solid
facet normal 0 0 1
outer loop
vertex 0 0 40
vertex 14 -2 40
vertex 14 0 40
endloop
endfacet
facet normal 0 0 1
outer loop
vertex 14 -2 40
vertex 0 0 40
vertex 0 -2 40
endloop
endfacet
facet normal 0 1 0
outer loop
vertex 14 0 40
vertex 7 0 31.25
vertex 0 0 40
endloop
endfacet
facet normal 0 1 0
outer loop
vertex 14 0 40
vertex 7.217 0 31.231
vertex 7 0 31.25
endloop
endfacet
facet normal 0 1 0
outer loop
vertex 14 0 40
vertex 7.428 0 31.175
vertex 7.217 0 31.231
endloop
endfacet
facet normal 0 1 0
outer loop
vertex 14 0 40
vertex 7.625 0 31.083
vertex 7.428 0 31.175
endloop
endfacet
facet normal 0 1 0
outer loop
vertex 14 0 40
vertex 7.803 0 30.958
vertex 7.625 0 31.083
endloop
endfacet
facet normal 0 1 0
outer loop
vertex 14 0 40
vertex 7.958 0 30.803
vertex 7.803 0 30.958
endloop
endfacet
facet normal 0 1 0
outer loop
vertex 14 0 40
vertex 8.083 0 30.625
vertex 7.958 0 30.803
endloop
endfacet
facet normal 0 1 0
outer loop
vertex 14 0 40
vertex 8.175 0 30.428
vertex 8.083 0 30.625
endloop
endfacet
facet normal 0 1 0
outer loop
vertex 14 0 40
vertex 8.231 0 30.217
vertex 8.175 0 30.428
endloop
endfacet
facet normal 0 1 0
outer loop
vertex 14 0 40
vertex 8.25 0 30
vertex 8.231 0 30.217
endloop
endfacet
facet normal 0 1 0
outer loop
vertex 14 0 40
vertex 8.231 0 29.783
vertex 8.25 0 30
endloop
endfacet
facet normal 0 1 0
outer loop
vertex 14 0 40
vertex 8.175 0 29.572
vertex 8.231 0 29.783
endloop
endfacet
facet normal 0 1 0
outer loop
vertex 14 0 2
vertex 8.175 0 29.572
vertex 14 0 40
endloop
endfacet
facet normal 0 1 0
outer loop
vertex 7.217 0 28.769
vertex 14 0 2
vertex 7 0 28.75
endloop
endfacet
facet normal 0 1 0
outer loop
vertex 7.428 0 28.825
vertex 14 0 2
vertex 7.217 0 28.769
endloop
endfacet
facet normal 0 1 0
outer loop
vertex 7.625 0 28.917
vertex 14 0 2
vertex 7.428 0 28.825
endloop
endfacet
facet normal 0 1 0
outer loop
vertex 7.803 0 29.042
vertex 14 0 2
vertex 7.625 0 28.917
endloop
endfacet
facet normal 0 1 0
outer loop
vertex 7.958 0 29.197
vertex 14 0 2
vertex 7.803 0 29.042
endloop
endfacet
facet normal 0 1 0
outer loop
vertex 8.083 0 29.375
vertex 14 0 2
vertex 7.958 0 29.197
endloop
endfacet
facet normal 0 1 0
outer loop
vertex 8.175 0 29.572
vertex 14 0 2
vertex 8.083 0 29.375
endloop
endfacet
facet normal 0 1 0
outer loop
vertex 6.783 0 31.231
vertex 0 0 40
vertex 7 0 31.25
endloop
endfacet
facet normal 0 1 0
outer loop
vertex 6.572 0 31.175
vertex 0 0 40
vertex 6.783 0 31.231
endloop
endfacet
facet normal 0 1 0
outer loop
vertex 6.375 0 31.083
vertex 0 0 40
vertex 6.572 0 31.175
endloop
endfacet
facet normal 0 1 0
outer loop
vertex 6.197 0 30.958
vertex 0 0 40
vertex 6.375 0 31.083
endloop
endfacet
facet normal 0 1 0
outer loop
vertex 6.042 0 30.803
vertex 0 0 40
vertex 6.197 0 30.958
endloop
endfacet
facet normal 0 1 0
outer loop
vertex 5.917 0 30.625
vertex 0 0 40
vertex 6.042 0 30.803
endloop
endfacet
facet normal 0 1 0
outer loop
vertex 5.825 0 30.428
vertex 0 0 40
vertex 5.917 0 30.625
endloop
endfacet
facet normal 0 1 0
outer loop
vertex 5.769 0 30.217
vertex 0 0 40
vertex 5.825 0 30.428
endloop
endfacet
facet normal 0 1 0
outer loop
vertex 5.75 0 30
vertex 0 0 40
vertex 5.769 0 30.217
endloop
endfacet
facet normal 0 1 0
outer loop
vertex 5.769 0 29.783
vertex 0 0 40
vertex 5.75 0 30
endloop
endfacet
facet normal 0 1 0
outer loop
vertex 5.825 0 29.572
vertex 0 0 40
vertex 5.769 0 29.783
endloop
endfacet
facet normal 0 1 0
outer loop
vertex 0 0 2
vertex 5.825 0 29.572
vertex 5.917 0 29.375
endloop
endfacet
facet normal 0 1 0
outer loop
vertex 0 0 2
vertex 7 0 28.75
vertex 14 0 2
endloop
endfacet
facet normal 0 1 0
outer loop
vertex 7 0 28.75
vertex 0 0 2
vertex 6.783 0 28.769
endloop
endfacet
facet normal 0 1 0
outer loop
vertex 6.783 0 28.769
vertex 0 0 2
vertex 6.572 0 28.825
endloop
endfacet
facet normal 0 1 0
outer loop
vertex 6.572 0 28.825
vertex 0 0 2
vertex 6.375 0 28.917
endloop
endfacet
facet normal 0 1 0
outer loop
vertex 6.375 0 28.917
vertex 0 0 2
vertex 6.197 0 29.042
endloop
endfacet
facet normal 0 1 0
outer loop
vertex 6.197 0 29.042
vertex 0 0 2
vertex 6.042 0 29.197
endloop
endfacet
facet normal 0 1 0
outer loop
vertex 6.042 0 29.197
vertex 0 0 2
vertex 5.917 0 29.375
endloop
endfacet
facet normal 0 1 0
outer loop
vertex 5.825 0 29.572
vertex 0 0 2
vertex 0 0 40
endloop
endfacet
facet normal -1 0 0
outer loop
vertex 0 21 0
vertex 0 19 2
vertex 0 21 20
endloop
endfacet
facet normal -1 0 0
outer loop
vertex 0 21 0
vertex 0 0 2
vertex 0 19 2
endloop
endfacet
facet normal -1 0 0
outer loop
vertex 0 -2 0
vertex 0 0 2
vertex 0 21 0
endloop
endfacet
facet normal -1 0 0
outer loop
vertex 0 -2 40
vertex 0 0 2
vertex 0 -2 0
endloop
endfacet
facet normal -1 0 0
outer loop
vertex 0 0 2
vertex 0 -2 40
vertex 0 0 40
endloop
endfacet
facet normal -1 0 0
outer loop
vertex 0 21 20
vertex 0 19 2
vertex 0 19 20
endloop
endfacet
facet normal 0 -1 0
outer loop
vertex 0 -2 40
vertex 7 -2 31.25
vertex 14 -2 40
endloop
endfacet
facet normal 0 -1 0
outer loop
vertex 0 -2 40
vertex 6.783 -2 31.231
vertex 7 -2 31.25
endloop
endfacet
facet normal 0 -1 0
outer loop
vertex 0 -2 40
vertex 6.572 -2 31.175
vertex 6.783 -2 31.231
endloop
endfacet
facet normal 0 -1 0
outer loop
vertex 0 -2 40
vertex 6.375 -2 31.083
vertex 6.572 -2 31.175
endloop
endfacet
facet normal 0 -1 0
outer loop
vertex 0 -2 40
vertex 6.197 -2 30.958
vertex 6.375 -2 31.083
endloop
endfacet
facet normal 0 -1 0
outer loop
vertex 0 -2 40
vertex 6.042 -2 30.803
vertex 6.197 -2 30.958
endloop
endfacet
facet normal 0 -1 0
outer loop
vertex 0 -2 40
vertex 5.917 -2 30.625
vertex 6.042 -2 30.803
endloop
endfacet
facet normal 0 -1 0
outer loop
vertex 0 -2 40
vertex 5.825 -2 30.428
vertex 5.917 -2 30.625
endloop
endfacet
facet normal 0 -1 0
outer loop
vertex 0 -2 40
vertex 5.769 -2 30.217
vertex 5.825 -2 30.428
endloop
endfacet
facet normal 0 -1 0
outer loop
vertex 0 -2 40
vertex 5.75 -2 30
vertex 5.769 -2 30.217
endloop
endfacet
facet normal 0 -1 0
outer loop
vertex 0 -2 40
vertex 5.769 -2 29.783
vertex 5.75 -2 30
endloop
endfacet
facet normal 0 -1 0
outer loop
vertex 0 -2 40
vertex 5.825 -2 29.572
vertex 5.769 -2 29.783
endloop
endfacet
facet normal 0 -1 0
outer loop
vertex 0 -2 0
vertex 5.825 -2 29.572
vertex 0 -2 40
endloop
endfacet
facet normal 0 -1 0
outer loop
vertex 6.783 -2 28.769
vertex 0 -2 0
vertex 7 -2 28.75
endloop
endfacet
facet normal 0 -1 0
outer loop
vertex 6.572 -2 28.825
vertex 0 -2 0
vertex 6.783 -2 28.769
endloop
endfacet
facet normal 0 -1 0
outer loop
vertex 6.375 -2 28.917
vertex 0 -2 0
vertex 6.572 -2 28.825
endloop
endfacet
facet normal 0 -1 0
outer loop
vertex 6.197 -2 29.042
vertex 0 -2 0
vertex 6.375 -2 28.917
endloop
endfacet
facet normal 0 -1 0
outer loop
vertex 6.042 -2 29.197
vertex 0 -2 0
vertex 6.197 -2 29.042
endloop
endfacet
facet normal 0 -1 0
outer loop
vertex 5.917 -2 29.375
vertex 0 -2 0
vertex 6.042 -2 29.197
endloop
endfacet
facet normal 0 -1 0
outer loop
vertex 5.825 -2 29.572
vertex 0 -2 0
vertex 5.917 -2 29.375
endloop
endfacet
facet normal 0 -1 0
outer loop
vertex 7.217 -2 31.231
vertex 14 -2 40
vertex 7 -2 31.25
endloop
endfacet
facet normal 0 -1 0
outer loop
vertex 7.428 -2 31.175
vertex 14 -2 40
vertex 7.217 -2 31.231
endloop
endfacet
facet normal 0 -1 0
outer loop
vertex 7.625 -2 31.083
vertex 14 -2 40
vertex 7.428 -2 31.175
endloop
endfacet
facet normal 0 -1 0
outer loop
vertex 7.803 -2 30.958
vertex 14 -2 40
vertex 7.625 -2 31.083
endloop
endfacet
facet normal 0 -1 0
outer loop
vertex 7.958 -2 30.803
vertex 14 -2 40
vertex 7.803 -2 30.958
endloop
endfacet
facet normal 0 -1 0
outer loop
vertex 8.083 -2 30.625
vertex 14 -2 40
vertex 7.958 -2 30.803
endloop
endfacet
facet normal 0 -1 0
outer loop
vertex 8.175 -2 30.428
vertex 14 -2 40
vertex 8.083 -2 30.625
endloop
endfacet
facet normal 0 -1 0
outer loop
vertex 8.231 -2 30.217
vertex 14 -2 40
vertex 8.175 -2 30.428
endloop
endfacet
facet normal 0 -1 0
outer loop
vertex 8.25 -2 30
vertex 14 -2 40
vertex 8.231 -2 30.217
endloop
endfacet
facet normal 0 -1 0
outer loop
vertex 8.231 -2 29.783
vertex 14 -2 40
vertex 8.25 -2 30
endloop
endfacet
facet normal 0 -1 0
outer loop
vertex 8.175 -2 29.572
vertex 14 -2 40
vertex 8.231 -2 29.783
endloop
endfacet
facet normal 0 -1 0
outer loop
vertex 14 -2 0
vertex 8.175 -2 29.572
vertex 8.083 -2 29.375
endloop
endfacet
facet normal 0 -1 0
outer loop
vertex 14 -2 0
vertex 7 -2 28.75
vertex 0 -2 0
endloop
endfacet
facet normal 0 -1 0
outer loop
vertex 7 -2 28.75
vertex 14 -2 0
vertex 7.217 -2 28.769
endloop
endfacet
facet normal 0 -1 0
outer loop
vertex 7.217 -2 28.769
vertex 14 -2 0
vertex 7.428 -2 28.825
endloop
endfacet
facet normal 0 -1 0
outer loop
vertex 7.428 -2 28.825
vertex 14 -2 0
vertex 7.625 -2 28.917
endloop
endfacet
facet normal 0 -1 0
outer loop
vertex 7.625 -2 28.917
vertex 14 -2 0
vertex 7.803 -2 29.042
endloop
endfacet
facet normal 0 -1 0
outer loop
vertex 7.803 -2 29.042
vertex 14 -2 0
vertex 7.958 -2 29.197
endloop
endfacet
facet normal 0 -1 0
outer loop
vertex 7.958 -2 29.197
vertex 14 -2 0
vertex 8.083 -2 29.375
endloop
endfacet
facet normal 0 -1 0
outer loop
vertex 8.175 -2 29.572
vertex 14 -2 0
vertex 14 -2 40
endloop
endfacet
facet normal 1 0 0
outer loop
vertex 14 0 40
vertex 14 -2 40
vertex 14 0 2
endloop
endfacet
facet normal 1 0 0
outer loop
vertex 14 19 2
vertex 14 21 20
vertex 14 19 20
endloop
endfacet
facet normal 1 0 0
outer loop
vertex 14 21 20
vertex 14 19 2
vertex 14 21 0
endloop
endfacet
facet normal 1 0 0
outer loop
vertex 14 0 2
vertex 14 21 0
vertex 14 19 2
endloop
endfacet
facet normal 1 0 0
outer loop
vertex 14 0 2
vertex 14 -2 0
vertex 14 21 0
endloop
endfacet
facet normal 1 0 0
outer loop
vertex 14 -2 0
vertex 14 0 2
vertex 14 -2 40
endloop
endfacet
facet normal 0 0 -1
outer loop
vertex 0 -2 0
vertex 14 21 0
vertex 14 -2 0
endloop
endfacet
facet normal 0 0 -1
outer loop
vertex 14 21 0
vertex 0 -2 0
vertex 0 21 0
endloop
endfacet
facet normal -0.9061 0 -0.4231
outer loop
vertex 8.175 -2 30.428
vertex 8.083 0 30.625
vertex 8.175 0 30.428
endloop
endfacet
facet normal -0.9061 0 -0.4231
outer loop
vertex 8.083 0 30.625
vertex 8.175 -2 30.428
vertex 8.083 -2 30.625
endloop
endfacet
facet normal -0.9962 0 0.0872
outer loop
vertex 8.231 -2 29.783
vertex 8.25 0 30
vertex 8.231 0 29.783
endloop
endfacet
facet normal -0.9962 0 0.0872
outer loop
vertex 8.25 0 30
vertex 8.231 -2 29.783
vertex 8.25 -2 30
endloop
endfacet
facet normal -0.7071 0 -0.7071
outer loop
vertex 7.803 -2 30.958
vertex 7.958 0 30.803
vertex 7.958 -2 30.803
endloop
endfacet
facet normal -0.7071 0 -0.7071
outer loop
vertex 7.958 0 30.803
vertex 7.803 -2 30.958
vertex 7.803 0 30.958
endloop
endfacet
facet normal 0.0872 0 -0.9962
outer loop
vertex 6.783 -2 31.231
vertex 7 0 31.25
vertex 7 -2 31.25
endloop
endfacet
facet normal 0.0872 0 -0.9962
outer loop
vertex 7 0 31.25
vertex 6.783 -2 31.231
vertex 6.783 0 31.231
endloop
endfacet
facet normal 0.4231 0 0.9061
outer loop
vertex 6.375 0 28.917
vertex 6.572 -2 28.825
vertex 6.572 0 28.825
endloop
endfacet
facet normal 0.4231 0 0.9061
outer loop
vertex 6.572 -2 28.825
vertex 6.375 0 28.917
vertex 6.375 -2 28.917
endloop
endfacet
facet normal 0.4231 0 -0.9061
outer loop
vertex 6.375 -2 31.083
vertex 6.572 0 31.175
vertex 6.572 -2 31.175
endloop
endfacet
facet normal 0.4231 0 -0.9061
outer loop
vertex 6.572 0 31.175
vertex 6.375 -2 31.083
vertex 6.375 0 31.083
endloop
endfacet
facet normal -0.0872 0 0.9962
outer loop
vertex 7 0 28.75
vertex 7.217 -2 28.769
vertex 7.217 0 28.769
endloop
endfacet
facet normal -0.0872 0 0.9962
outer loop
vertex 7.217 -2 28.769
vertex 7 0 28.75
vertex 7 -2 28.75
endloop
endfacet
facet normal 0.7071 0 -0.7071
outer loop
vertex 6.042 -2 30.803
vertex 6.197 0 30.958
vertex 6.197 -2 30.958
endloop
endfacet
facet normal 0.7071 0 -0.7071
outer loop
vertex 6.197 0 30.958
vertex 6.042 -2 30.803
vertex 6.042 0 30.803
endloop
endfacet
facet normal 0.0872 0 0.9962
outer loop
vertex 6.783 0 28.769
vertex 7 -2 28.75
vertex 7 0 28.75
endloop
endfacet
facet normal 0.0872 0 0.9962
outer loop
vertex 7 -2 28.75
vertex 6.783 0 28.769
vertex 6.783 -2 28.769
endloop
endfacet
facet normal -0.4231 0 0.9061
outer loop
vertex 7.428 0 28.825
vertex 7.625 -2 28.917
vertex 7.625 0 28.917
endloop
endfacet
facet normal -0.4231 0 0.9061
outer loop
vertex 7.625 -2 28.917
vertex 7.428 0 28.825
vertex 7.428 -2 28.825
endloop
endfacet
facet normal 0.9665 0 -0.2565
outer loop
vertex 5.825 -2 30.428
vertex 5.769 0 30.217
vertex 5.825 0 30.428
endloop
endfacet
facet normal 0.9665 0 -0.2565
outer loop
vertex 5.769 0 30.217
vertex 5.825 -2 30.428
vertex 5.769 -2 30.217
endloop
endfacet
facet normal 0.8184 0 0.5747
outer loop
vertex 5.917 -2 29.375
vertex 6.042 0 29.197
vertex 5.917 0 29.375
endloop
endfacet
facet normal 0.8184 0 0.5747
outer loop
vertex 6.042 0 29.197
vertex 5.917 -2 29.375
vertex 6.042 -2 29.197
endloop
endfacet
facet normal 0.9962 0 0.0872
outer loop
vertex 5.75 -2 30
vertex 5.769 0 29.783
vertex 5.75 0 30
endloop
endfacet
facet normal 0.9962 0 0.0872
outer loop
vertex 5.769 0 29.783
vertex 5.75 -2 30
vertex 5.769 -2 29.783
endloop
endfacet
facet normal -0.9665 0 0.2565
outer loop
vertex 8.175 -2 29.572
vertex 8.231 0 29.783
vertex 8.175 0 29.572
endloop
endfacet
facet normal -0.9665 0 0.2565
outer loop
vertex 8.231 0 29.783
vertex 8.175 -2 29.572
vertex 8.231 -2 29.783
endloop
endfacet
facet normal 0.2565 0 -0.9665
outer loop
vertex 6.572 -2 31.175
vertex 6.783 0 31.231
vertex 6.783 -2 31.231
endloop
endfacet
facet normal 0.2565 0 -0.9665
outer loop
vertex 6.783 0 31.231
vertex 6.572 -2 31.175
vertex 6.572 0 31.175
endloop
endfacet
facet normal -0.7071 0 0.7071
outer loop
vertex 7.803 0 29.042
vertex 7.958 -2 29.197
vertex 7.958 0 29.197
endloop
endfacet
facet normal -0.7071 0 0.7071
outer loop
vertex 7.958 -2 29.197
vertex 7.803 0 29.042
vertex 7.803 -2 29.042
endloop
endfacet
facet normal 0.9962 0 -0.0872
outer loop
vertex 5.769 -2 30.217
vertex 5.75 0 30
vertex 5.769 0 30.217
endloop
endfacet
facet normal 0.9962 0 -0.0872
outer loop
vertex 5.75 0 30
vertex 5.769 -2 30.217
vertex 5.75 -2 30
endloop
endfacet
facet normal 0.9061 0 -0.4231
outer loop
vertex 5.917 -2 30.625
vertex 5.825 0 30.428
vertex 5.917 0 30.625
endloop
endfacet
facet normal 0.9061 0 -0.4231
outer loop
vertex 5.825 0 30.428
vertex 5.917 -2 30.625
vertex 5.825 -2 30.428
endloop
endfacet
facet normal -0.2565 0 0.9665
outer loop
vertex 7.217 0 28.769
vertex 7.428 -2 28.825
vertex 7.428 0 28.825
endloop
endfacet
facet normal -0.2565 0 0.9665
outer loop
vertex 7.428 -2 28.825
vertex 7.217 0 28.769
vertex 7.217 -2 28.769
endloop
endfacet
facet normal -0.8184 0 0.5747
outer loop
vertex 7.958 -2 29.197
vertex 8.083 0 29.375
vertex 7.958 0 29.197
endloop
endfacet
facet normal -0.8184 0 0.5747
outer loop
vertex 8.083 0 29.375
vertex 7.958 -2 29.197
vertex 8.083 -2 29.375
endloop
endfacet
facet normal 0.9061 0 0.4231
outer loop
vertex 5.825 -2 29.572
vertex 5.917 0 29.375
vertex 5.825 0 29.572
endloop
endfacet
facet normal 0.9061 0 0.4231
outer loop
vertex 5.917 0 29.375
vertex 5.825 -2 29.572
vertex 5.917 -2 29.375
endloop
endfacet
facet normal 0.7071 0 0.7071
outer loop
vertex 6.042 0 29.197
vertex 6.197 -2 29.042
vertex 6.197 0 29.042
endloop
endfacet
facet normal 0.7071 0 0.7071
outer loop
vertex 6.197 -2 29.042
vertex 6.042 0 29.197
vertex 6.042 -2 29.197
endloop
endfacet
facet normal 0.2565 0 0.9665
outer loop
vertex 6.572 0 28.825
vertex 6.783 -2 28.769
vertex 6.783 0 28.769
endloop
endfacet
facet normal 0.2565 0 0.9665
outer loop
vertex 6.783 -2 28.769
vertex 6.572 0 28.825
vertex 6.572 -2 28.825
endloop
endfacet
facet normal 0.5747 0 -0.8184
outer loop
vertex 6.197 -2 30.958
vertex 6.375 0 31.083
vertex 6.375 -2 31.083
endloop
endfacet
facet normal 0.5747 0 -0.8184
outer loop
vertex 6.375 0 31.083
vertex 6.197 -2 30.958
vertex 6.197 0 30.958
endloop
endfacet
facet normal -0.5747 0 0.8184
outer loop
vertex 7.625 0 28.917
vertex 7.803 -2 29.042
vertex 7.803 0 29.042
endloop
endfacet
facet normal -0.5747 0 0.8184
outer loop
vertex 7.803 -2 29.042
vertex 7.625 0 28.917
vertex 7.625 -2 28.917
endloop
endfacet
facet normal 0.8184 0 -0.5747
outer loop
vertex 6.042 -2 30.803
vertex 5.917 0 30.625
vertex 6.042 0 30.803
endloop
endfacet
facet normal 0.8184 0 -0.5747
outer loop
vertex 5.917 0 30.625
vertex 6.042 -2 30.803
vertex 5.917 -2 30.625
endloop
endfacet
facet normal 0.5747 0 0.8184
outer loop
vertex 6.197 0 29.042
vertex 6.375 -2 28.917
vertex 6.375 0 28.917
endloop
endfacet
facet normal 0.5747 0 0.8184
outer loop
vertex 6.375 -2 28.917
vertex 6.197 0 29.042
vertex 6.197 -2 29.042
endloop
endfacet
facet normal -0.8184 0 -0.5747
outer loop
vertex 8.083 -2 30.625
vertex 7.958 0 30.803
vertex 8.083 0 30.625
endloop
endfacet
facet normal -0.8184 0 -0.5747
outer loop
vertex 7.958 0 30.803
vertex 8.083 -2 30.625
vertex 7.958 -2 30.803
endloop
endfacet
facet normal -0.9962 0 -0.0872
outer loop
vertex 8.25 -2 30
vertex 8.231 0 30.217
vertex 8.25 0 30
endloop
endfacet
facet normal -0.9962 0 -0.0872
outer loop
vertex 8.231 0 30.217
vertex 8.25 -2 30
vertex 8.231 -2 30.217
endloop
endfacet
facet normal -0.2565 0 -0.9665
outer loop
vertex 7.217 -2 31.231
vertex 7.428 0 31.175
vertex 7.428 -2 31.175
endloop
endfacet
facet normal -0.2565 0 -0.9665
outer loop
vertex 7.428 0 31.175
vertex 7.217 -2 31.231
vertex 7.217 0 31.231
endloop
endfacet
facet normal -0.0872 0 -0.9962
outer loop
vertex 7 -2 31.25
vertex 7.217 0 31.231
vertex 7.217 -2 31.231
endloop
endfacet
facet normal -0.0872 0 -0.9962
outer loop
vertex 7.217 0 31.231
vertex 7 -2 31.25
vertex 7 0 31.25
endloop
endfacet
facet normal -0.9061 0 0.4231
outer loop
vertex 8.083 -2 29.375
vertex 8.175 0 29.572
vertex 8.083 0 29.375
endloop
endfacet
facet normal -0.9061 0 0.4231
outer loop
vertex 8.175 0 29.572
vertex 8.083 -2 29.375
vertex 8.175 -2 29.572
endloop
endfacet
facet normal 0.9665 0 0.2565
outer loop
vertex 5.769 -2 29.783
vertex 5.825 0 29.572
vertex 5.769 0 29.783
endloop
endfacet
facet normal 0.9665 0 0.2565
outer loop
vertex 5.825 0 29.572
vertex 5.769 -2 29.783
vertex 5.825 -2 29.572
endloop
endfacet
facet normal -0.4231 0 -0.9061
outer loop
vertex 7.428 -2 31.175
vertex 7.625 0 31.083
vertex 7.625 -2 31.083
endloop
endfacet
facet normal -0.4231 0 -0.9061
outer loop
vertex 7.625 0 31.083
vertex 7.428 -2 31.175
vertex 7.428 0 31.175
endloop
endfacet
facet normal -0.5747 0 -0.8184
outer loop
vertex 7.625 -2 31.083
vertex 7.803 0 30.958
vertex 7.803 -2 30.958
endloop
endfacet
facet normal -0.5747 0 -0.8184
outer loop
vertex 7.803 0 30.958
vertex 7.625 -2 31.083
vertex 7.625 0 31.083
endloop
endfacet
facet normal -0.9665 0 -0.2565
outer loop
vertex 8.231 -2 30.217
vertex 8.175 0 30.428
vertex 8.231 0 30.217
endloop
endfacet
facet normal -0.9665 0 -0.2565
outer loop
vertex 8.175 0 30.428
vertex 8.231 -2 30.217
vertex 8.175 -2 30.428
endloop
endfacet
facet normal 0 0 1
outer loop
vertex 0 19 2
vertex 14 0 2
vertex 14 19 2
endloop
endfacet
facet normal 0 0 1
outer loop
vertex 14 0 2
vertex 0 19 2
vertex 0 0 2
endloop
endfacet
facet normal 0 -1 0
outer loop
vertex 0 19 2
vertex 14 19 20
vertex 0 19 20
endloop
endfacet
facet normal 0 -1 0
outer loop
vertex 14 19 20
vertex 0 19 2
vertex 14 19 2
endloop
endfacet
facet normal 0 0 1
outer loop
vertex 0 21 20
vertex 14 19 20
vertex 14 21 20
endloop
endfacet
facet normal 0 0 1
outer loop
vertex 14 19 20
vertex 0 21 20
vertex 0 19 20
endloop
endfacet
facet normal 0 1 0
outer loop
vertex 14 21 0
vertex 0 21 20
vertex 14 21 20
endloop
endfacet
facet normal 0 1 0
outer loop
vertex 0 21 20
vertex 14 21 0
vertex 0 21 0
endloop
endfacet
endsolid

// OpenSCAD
$t=2;
$d=21-$t; 
$h1=20;
$h2=$h1*2;
$b=14;
$s=2.5;
$i=36;
$d2=4.8;
$dh=2.0;

module bodenplatte()
{
    linear_extrude(height=$t)
    square([$b,$d]);
}

module rueckseite()
{
    rotate([90,0,0])
    linear_extrude(height=$t)
    square([$b,$h2]);
}

module vorderseite()
{
    translate([0,$d+$t,0])
    rotate([90,0,0])
    linear_extrude(height=$t)
    square([$b,$h1]);
}

module loch()
{
    color("gray")
    translate([$b/2,0,$h1+$h1/2])
    rotate([90,0,0])
    linear_extrude(height=$t)
    circle(d=$s,$fn=$i);
}

module john_cena()
{
    color("white")
    translate([$b/2,-$t+$dh,$h1+$h1/2])
    rotate([270,0,0])
    cylinder($dh,d1=$s,d2=$d2,$fn=$i);
}

module rueckseite_mit_loch()
{
    difference()
    {
        rueckseite();
        loch();
        john_cena();
    }
}

bodenplatte();
vorderseite();
rueckseite_mit_loch();
